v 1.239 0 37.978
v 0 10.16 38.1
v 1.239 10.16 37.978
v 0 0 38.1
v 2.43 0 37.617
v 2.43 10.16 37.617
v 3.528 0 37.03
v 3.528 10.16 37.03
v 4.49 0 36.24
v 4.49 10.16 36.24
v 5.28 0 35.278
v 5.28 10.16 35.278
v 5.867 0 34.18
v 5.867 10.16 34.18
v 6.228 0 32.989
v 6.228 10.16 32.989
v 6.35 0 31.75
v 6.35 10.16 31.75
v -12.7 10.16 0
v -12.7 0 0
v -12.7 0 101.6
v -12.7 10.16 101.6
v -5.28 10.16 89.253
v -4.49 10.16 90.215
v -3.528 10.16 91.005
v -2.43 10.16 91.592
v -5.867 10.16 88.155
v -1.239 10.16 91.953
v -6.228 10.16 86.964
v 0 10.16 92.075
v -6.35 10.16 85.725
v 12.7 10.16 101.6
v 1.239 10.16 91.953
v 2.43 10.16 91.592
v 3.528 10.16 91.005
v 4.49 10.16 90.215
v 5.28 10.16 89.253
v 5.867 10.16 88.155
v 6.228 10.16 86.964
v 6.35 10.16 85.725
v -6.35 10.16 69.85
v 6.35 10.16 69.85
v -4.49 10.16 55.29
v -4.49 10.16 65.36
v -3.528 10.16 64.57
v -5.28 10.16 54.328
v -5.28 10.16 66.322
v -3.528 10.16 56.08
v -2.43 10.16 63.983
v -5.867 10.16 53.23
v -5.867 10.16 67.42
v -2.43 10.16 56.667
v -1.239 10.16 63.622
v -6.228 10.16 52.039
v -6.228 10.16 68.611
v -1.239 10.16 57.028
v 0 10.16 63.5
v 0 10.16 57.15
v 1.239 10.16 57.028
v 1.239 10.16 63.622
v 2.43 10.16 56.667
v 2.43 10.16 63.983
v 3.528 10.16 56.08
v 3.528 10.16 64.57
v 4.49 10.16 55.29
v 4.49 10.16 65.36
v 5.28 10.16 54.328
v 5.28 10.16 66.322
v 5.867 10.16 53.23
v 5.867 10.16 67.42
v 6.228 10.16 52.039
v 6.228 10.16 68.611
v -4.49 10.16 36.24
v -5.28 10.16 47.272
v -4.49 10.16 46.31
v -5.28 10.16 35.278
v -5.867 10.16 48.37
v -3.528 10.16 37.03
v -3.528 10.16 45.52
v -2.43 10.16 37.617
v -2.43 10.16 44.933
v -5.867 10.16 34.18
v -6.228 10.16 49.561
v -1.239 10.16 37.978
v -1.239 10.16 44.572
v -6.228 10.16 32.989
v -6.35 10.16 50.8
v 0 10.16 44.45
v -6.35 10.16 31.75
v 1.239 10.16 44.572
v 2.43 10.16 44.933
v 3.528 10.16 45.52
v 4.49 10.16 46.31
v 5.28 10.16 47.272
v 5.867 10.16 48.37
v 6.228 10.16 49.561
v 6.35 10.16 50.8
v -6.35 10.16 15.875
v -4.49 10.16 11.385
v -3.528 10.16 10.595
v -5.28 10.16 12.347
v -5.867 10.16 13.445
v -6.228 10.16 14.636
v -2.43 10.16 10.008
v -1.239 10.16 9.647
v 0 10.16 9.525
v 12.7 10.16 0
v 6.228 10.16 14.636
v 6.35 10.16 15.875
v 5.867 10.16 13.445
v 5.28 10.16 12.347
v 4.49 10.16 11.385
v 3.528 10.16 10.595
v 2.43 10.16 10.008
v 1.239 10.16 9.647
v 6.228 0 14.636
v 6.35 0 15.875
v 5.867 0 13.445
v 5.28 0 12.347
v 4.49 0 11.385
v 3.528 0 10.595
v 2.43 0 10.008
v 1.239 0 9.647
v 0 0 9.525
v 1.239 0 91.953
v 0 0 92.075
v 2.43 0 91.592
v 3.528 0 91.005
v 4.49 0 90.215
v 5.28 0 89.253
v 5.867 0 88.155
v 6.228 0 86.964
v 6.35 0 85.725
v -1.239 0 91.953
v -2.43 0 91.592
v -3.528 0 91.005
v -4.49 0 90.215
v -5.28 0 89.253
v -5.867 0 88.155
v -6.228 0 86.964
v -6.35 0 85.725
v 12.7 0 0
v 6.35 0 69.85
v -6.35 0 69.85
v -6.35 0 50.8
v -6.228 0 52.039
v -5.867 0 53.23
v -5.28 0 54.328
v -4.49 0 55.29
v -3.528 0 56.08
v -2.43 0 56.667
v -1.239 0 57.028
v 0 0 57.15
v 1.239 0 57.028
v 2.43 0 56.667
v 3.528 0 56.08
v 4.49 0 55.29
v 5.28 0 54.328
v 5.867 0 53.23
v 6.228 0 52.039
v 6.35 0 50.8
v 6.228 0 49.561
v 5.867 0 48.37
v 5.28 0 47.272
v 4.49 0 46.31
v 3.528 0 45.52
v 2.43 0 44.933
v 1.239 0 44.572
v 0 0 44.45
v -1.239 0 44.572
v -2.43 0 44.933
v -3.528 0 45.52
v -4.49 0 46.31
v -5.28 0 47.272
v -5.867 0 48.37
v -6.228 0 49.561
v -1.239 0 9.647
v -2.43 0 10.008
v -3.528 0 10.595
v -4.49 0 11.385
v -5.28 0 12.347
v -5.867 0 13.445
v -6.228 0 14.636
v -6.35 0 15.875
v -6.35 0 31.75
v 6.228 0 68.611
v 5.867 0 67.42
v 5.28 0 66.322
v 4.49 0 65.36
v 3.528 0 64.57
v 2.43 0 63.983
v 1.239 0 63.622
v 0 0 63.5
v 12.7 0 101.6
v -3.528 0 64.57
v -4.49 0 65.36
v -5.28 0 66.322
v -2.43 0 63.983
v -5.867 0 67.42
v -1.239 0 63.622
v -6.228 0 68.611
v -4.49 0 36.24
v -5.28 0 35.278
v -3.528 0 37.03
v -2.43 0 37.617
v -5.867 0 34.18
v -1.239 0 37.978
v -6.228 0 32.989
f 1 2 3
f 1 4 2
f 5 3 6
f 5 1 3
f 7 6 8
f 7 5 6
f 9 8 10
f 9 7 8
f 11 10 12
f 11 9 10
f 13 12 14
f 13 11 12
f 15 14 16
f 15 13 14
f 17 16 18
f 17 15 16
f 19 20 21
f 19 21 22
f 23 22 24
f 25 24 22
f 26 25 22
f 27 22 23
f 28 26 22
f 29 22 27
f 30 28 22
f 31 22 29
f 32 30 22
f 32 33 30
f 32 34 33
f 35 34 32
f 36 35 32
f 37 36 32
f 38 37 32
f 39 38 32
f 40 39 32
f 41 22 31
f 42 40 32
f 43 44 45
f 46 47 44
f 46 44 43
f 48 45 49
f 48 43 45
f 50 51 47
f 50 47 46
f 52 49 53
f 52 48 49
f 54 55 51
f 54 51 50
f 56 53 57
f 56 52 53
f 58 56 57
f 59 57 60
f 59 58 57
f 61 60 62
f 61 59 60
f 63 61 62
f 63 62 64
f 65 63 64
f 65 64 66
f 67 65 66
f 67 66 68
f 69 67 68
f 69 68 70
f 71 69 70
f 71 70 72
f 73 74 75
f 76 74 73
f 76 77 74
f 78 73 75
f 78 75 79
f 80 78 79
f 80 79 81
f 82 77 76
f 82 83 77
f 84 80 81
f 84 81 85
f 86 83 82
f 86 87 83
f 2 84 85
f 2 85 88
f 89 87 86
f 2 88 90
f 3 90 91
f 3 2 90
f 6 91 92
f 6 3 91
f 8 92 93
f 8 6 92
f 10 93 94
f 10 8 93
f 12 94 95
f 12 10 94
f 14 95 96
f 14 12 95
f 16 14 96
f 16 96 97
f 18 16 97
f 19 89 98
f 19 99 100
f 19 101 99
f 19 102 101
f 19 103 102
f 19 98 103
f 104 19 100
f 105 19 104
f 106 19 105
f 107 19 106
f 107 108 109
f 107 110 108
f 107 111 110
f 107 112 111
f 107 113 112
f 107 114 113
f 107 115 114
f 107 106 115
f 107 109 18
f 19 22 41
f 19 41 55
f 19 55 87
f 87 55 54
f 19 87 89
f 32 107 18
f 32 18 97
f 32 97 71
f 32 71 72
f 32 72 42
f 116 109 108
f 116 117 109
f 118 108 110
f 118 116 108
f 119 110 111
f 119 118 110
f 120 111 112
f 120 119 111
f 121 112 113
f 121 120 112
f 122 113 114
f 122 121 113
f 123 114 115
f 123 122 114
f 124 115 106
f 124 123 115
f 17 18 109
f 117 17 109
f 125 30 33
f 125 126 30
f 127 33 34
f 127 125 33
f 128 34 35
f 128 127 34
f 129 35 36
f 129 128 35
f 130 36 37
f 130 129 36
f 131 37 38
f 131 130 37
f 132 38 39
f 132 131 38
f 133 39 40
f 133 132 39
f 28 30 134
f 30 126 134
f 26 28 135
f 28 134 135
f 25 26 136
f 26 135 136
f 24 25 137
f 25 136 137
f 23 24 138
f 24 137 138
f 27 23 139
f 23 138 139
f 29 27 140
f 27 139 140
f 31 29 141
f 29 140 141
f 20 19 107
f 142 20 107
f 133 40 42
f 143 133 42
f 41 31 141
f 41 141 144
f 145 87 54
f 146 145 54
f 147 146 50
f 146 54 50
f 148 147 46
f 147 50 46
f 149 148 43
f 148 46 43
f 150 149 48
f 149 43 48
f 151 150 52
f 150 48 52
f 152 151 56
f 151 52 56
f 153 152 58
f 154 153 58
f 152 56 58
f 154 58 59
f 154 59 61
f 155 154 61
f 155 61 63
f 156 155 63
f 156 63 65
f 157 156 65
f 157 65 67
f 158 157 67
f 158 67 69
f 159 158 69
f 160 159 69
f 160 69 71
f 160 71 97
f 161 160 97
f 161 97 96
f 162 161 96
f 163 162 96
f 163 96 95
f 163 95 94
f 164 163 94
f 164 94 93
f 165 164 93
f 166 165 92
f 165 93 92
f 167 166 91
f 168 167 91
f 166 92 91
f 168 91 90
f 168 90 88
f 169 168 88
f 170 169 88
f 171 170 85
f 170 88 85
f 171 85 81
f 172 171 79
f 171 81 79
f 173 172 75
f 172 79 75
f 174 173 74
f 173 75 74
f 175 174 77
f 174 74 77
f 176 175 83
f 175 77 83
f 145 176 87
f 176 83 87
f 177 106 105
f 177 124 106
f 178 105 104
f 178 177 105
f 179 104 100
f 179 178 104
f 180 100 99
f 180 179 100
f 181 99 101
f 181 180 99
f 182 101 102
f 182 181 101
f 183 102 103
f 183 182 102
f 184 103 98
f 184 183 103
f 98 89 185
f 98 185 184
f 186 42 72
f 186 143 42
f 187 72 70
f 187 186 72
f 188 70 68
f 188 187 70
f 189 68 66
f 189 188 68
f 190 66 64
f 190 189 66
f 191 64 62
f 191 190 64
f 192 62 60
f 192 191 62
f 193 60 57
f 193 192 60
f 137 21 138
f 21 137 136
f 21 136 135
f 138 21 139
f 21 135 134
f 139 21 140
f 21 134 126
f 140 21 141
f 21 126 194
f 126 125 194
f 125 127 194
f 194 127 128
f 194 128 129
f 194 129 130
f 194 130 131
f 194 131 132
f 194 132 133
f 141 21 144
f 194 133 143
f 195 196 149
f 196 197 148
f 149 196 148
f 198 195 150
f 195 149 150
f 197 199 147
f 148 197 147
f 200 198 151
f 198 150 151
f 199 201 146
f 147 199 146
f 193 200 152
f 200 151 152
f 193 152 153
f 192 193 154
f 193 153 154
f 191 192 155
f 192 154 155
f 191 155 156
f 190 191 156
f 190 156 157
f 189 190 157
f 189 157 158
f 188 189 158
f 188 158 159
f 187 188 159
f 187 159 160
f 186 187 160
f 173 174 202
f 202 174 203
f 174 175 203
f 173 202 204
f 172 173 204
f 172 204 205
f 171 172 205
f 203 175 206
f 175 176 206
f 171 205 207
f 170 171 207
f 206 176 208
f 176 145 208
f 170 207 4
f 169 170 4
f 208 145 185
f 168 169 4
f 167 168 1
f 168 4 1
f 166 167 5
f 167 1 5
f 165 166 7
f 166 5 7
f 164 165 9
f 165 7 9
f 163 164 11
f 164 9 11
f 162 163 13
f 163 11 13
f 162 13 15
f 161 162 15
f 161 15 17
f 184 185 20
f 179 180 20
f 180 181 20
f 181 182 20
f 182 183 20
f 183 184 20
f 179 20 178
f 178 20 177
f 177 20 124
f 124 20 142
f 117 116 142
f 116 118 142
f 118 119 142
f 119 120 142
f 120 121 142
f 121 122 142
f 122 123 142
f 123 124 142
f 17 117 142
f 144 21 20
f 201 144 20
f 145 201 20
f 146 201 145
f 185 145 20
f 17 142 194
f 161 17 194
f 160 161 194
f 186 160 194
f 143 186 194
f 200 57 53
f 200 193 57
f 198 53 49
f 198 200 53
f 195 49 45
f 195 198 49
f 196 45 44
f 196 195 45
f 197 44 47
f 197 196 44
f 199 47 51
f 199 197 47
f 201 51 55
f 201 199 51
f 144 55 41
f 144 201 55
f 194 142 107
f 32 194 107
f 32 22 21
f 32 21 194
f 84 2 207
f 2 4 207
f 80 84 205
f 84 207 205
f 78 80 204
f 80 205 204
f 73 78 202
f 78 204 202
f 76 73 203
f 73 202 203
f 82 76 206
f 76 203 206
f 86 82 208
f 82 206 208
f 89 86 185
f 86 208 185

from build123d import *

# Parameters (mm, degrees)
SKETCH1_W           = 25.4
SKETCH1_H           = 10.16
BOSS_EXTRUDE1_DEPTH = 101.6
SKETCH2_R           = 6.35
CUT_EXTRUDE1_DEPTH  = 88.9
SKETCH5_W           = 12.7
SKETCH5_H           = 28.575
CUT_EXTRUDE3_DEPTH  = 15.875
FILLET1_R           = 6.35


with BuildPart() as part:
    # Sketch1 → Boss-Extrude1 (new body)
    with BuildSketch(Plane.XY):
        with Locations((0, 5.08)):
            Rectangle(SKETCH1_W, SKETCH1_H)
    extrude(amount=BOSS_EXTRUDE1_DEPTH)

    # Sketch2 → Cut-Extrude1 (cut)
    with BuildSketch(Plane(origin=(0, 10.16, 0), x_dir=(1, 0, 0), z_dir=(0, 1, 0))):
        with Locations(Location((0, -50.8, 0), (0, 0, 180))):
            Circle(SKETCH2_R)
    extrude(amount=-CUT_EXTRUDE1_DEPTH, mode=Mode.SUBTRACT)

    # Sketch5 → Cut-Extrude3 (cut)
    with BuildSketch(Plane(origin=(0, 10.16, 0), x_dir=(1, 0, 0), z_dir=(0, 1, 0))):
        with Locations((0, -77.7875)):
            Rectangle(SKETCH5_W, SKETCH5_H)
        with Locations((0, -23.8125)):
            Rectangle(SKETCH5_W, SKETCH5_H)
    extrude(amount=-CUT_EXTRUDE3_DEPTH, mode=Mode.SUBTRACT)

    # Fillet1
    fillet1_edges = [part.edges().sort_by_distance(p)[0] for p in [
        (-6.35, 5.08, 92.075),
        (-6.35, 5.08, 38.1),
        (-6.35, 5.08, 63.5),
        (-6.35, 5.08, 9.525),
        (6.35, 5.08, 9.525),
        (6.35, 5.08, 63.5),
        (6.35, 5.08, 92.075),
        (6.35, 5.08, 38.1),
    ]]
    fillet(fillet1_edges, radius=FILLET1_R - 0.0001)  # a hair under: the kernel refuses the full size


solid = part.part
